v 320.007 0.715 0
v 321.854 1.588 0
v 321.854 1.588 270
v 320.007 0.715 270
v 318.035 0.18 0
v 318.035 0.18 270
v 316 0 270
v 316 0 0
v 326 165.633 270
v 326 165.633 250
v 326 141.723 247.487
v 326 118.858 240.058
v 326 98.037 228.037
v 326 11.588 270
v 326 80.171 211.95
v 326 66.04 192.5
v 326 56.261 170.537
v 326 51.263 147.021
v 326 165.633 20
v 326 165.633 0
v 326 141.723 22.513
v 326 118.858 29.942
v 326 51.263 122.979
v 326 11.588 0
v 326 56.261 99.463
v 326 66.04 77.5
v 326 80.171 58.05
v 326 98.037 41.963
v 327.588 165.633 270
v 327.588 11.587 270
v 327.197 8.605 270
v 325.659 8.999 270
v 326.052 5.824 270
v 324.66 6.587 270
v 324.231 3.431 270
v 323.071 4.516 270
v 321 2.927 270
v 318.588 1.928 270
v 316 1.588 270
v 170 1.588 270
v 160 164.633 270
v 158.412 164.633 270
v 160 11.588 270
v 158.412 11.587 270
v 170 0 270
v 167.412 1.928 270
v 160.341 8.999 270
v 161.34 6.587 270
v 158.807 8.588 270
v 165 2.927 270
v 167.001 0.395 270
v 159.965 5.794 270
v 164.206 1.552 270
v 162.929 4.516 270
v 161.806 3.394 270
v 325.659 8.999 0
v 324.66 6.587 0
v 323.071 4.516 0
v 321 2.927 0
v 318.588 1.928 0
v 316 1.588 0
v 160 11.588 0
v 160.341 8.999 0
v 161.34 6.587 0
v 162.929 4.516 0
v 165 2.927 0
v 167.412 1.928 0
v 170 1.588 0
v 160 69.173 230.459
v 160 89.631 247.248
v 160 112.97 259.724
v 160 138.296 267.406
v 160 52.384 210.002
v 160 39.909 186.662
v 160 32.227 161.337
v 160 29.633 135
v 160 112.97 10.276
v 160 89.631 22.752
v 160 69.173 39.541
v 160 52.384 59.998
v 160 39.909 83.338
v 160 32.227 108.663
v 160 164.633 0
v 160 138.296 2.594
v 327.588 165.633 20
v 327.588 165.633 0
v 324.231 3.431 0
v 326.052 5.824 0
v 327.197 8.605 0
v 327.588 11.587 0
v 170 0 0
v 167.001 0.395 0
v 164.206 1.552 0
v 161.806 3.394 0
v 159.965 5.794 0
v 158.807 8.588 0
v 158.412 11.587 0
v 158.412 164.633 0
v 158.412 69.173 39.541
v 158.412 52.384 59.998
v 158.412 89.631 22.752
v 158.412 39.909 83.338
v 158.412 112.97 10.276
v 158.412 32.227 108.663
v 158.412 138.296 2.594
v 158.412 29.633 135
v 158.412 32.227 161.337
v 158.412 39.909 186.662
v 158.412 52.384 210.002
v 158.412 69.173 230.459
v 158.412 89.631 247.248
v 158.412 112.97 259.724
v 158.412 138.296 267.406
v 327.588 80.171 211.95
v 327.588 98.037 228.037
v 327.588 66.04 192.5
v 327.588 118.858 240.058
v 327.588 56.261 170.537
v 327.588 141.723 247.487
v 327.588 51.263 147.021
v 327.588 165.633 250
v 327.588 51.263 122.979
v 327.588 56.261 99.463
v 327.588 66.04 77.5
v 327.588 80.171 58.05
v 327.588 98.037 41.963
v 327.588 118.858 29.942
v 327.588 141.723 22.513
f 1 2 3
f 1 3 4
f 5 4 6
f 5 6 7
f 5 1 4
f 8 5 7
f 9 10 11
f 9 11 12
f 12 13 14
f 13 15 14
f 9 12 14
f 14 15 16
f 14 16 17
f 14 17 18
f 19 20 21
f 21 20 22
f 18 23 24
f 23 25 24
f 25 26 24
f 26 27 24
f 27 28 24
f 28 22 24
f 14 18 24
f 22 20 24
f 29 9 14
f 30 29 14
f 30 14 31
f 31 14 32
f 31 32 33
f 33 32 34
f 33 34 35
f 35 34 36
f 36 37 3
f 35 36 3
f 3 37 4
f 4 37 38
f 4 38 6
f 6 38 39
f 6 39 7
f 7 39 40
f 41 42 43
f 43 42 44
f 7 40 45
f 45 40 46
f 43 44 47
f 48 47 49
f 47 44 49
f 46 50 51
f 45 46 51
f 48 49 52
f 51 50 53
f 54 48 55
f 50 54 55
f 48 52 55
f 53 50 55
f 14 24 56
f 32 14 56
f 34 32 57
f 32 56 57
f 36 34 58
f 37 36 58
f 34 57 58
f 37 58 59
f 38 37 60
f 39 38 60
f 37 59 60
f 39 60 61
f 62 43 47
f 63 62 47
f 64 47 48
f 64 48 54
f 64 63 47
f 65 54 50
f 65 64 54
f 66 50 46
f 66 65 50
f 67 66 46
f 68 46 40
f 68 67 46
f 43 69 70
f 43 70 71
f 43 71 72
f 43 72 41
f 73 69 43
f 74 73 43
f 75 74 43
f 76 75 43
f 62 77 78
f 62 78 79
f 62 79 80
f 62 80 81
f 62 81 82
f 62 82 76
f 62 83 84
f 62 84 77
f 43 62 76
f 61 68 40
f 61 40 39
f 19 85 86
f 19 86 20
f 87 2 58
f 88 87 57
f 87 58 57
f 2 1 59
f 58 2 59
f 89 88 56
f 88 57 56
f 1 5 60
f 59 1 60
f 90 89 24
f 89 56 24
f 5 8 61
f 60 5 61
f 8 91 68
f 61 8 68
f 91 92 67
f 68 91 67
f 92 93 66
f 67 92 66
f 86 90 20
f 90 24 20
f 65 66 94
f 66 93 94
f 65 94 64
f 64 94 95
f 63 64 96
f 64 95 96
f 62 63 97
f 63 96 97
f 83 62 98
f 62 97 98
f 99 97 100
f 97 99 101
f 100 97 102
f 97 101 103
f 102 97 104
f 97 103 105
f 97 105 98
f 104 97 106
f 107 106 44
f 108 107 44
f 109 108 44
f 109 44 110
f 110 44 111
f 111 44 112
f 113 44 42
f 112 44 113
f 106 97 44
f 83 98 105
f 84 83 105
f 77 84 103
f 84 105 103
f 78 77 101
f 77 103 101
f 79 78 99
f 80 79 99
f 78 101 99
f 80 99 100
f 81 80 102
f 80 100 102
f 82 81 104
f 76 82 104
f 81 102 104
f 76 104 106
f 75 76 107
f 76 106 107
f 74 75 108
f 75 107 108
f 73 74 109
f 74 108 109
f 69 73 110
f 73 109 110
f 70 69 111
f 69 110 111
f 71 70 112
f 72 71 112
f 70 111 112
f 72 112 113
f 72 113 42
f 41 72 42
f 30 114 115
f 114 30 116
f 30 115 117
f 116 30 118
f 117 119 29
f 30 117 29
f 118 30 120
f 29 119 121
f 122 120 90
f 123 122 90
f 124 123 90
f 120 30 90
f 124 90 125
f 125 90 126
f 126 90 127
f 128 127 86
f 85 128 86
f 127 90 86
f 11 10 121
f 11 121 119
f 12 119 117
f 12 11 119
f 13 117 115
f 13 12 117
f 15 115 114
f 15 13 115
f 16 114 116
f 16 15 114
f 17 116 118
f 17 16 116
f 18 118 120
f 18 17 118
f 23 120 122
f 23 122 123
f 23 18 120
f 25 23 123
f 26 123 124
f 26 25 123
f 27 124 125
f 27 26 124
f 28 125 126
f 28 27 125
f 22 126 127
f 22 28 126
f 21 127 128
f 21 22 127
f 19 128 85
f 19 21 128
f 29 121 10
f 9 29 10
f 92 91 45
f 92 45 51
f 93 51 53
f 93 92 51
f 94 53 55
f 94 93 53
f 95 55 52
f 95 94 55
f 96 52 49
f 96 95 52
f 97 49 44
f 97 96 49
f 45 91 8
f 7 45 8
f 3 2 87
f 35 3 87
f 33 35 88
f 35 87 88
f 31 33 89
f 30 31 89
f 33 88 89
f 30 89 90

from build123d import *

# Parameters (mm, degrees)
SKETCH1_W                  = 487
SKETCH1_H                  = 270
BOSS_EXTRUDE1_DEPTH        = 1.5875
SKETCH2_R                  = 135
SKETCH2_R_2                = 115
CUT_EXTRUDE1_DEPTH         = 557.840659575
SKETCHED_BEND2_DEPTH       = 270
SKETCHED_BEND2_2_DEPTH     = 270
SKETCHED_START             = -1
SKETCHED_BEND2_3_OUTLINE_W = 1.5875
SKETCHED_BEND2_3_OUTLINE_H = 270
SKETCHED_BEND2_3_DEPTH     = 161
SKETCHED_START_2           = 326
SKETCHED_BEND2_4_DEPTH     = 1.5875
SKETCHED_START_3           = 158.4125
SKETCHED_BEND2_5_DEPTH     = 11.5875
SKETCHED_BEND2_6_DEPTH     = 270


with BuildPart() as part:
    # Sketch1 → Boss-Extrude1 (new body)
    with BuildSketch(Plane(origin=(0, 0, 0), x_dir=(1, 0, 0), z_dir=(0, 1, 0))):
        with Locations((243.5, -135)):
            Rectangle(SKETCH1_W, SKETCH1_H)
    extrude(amount=BOSS_EXTRUDE1_DEPTH)

    # Sketch2 → Cut-Extrude1 (cut, through all)
    with BuildSketch(Plane(origin=(0, 1.5875, 0), x_dir=(1, 0, 0), z_dir=(0, 1, 0))):
        with Locations((0, -135)):
            Circle(SKETCH2_R)
        with Locations((487, -135)):
            Circle(SKETCH2_R_2)
    extrude(amount=-CUT_EXTRUDE1_DEPTH, mode=Mode.SUBTRACT)

    # Sketched Bend2: read off the stored shape, not the designer's step
    # Sketched Bend2 outline → Sketched Bend2 (cut)
    with BuildSketch(Plane.XY):
        with BuildLine():
            ThreePointArc((321.854071767, 1.5875), (319.032750917, 0.403914791), (316, 0))
            Line((316, 0), (487, 0))
            Line((487, 0), (487, 1.5875))
            Line((487, 1.5875), (321.854071767, 1.5875))
        make_face()
    extrude(amount=SKETCHED_BEND2_DEPTH, mode=Mode.SUBTRACT)

    # Sketched Bend2 2 outline → Sketched Bend2 2 (add)
    with BuildSketch(Plane.XY):
        with BuildLine():
            ThreePointArc((326, 11.5875), (323.071067812, 4.516432188), (316, 1.5875))
            Line((316, 1.5875), (321.854071767, 1.5875))
            ThreePointArc((321.854071767, 1.5875), (326.052467678, 5.8239898), (327.5875, 11.5875))
            Line((327.5875, 11.5875), (327.5875, 165.632717148))
            Line((327.5875, 165.632717148), (326, 165.632717148))
            Line((326, 165.632717148), (326, 11.5875))
        make_face()
    extrude(amount=SKETCHED_BEND2_2_DEPTH)

    # Sketched Bend2 3 outline → Sketched Bend2 3 (cut)
    with BuildSketch(Plane.YZ.offset(SKETCHED_START)):
        with Locations((0.79375, 135)):
            Rectangle(SKETCHED_BEND2_3_OUTLINE_W, SKETCHED_BEND2_3_OUTLINE_H)
    extrude(amount=SKETCHED_BEND2_3_DEPTH, mode=Mode.SUBTRACT)

    # Sketched Bend2 4 outline → Sketched Bend2 4 (cut)
    with BuildSketch(Plane.YZ.offset(SKETCHED_START_2)):
        with BuildLine():
            ThreePointArc((165.632717148, 250), (50.632717148, 135), (165.632717148, 20))
            Line((165.632717148, 20), (165.632717148, 250))
        make_face()
    extrude(amount=SKETCHED_BEND2_4_DEPTH, mode=Mode.SUBTRACT)

    # Sketched Bend2 5 outline → Sketched Bend2 5 (add)
    with BuildSketch(Plane.YZ.offset(SKETCHED_START_3)):
        with BuildLine():
            Line((164.632717148, 270), (1.5875, 270))
            Line((1.5875, 270), (1.5875, 0))
            Line((1.5875, 0), (164.632717148, 0))
            ThreePointArc((164.632717148, 0), (29.632717148, 135), (164.632717148, 270))
        make_face()
    extrude(amount=SKETCHED_BEND2_5_DEPTH)

    # Sketched Bend2 6 outline → Sketched Bend2 6 (cut)
    with BuildSketch(Plane.XY):
        with BuildLine():
            Line((160, 167), (160, 11.5875))
            ThreePointArc((160, 11.5875), (162.928932188, 4.516432188), (170, 1.5875))
            Line((170, 1.5875), (170, 167))
            Line((170, 167), (160, 167))
        make_face()
        with BuildLine():
            Line((329, -2), (329, 0))
            Line((329, 0), (170, 0))
            ThreePointArc((170, 0), (161.806400173, 3.393900173), (158.4125, 11.5875))
            Line((158.4125, 11.5875), (158.4125, 1.5875))
            Line((158.4125, 1.5875), (160, 1.5875))
            Line((160, 1.5875), (160, -2))
            Line((160, -2), (329, -2))
        make_face()
    extrude(amount=SKETCHED_BEND2_6_DEPTH, mode=Mode.SUBTRACT)


solid = part.part
